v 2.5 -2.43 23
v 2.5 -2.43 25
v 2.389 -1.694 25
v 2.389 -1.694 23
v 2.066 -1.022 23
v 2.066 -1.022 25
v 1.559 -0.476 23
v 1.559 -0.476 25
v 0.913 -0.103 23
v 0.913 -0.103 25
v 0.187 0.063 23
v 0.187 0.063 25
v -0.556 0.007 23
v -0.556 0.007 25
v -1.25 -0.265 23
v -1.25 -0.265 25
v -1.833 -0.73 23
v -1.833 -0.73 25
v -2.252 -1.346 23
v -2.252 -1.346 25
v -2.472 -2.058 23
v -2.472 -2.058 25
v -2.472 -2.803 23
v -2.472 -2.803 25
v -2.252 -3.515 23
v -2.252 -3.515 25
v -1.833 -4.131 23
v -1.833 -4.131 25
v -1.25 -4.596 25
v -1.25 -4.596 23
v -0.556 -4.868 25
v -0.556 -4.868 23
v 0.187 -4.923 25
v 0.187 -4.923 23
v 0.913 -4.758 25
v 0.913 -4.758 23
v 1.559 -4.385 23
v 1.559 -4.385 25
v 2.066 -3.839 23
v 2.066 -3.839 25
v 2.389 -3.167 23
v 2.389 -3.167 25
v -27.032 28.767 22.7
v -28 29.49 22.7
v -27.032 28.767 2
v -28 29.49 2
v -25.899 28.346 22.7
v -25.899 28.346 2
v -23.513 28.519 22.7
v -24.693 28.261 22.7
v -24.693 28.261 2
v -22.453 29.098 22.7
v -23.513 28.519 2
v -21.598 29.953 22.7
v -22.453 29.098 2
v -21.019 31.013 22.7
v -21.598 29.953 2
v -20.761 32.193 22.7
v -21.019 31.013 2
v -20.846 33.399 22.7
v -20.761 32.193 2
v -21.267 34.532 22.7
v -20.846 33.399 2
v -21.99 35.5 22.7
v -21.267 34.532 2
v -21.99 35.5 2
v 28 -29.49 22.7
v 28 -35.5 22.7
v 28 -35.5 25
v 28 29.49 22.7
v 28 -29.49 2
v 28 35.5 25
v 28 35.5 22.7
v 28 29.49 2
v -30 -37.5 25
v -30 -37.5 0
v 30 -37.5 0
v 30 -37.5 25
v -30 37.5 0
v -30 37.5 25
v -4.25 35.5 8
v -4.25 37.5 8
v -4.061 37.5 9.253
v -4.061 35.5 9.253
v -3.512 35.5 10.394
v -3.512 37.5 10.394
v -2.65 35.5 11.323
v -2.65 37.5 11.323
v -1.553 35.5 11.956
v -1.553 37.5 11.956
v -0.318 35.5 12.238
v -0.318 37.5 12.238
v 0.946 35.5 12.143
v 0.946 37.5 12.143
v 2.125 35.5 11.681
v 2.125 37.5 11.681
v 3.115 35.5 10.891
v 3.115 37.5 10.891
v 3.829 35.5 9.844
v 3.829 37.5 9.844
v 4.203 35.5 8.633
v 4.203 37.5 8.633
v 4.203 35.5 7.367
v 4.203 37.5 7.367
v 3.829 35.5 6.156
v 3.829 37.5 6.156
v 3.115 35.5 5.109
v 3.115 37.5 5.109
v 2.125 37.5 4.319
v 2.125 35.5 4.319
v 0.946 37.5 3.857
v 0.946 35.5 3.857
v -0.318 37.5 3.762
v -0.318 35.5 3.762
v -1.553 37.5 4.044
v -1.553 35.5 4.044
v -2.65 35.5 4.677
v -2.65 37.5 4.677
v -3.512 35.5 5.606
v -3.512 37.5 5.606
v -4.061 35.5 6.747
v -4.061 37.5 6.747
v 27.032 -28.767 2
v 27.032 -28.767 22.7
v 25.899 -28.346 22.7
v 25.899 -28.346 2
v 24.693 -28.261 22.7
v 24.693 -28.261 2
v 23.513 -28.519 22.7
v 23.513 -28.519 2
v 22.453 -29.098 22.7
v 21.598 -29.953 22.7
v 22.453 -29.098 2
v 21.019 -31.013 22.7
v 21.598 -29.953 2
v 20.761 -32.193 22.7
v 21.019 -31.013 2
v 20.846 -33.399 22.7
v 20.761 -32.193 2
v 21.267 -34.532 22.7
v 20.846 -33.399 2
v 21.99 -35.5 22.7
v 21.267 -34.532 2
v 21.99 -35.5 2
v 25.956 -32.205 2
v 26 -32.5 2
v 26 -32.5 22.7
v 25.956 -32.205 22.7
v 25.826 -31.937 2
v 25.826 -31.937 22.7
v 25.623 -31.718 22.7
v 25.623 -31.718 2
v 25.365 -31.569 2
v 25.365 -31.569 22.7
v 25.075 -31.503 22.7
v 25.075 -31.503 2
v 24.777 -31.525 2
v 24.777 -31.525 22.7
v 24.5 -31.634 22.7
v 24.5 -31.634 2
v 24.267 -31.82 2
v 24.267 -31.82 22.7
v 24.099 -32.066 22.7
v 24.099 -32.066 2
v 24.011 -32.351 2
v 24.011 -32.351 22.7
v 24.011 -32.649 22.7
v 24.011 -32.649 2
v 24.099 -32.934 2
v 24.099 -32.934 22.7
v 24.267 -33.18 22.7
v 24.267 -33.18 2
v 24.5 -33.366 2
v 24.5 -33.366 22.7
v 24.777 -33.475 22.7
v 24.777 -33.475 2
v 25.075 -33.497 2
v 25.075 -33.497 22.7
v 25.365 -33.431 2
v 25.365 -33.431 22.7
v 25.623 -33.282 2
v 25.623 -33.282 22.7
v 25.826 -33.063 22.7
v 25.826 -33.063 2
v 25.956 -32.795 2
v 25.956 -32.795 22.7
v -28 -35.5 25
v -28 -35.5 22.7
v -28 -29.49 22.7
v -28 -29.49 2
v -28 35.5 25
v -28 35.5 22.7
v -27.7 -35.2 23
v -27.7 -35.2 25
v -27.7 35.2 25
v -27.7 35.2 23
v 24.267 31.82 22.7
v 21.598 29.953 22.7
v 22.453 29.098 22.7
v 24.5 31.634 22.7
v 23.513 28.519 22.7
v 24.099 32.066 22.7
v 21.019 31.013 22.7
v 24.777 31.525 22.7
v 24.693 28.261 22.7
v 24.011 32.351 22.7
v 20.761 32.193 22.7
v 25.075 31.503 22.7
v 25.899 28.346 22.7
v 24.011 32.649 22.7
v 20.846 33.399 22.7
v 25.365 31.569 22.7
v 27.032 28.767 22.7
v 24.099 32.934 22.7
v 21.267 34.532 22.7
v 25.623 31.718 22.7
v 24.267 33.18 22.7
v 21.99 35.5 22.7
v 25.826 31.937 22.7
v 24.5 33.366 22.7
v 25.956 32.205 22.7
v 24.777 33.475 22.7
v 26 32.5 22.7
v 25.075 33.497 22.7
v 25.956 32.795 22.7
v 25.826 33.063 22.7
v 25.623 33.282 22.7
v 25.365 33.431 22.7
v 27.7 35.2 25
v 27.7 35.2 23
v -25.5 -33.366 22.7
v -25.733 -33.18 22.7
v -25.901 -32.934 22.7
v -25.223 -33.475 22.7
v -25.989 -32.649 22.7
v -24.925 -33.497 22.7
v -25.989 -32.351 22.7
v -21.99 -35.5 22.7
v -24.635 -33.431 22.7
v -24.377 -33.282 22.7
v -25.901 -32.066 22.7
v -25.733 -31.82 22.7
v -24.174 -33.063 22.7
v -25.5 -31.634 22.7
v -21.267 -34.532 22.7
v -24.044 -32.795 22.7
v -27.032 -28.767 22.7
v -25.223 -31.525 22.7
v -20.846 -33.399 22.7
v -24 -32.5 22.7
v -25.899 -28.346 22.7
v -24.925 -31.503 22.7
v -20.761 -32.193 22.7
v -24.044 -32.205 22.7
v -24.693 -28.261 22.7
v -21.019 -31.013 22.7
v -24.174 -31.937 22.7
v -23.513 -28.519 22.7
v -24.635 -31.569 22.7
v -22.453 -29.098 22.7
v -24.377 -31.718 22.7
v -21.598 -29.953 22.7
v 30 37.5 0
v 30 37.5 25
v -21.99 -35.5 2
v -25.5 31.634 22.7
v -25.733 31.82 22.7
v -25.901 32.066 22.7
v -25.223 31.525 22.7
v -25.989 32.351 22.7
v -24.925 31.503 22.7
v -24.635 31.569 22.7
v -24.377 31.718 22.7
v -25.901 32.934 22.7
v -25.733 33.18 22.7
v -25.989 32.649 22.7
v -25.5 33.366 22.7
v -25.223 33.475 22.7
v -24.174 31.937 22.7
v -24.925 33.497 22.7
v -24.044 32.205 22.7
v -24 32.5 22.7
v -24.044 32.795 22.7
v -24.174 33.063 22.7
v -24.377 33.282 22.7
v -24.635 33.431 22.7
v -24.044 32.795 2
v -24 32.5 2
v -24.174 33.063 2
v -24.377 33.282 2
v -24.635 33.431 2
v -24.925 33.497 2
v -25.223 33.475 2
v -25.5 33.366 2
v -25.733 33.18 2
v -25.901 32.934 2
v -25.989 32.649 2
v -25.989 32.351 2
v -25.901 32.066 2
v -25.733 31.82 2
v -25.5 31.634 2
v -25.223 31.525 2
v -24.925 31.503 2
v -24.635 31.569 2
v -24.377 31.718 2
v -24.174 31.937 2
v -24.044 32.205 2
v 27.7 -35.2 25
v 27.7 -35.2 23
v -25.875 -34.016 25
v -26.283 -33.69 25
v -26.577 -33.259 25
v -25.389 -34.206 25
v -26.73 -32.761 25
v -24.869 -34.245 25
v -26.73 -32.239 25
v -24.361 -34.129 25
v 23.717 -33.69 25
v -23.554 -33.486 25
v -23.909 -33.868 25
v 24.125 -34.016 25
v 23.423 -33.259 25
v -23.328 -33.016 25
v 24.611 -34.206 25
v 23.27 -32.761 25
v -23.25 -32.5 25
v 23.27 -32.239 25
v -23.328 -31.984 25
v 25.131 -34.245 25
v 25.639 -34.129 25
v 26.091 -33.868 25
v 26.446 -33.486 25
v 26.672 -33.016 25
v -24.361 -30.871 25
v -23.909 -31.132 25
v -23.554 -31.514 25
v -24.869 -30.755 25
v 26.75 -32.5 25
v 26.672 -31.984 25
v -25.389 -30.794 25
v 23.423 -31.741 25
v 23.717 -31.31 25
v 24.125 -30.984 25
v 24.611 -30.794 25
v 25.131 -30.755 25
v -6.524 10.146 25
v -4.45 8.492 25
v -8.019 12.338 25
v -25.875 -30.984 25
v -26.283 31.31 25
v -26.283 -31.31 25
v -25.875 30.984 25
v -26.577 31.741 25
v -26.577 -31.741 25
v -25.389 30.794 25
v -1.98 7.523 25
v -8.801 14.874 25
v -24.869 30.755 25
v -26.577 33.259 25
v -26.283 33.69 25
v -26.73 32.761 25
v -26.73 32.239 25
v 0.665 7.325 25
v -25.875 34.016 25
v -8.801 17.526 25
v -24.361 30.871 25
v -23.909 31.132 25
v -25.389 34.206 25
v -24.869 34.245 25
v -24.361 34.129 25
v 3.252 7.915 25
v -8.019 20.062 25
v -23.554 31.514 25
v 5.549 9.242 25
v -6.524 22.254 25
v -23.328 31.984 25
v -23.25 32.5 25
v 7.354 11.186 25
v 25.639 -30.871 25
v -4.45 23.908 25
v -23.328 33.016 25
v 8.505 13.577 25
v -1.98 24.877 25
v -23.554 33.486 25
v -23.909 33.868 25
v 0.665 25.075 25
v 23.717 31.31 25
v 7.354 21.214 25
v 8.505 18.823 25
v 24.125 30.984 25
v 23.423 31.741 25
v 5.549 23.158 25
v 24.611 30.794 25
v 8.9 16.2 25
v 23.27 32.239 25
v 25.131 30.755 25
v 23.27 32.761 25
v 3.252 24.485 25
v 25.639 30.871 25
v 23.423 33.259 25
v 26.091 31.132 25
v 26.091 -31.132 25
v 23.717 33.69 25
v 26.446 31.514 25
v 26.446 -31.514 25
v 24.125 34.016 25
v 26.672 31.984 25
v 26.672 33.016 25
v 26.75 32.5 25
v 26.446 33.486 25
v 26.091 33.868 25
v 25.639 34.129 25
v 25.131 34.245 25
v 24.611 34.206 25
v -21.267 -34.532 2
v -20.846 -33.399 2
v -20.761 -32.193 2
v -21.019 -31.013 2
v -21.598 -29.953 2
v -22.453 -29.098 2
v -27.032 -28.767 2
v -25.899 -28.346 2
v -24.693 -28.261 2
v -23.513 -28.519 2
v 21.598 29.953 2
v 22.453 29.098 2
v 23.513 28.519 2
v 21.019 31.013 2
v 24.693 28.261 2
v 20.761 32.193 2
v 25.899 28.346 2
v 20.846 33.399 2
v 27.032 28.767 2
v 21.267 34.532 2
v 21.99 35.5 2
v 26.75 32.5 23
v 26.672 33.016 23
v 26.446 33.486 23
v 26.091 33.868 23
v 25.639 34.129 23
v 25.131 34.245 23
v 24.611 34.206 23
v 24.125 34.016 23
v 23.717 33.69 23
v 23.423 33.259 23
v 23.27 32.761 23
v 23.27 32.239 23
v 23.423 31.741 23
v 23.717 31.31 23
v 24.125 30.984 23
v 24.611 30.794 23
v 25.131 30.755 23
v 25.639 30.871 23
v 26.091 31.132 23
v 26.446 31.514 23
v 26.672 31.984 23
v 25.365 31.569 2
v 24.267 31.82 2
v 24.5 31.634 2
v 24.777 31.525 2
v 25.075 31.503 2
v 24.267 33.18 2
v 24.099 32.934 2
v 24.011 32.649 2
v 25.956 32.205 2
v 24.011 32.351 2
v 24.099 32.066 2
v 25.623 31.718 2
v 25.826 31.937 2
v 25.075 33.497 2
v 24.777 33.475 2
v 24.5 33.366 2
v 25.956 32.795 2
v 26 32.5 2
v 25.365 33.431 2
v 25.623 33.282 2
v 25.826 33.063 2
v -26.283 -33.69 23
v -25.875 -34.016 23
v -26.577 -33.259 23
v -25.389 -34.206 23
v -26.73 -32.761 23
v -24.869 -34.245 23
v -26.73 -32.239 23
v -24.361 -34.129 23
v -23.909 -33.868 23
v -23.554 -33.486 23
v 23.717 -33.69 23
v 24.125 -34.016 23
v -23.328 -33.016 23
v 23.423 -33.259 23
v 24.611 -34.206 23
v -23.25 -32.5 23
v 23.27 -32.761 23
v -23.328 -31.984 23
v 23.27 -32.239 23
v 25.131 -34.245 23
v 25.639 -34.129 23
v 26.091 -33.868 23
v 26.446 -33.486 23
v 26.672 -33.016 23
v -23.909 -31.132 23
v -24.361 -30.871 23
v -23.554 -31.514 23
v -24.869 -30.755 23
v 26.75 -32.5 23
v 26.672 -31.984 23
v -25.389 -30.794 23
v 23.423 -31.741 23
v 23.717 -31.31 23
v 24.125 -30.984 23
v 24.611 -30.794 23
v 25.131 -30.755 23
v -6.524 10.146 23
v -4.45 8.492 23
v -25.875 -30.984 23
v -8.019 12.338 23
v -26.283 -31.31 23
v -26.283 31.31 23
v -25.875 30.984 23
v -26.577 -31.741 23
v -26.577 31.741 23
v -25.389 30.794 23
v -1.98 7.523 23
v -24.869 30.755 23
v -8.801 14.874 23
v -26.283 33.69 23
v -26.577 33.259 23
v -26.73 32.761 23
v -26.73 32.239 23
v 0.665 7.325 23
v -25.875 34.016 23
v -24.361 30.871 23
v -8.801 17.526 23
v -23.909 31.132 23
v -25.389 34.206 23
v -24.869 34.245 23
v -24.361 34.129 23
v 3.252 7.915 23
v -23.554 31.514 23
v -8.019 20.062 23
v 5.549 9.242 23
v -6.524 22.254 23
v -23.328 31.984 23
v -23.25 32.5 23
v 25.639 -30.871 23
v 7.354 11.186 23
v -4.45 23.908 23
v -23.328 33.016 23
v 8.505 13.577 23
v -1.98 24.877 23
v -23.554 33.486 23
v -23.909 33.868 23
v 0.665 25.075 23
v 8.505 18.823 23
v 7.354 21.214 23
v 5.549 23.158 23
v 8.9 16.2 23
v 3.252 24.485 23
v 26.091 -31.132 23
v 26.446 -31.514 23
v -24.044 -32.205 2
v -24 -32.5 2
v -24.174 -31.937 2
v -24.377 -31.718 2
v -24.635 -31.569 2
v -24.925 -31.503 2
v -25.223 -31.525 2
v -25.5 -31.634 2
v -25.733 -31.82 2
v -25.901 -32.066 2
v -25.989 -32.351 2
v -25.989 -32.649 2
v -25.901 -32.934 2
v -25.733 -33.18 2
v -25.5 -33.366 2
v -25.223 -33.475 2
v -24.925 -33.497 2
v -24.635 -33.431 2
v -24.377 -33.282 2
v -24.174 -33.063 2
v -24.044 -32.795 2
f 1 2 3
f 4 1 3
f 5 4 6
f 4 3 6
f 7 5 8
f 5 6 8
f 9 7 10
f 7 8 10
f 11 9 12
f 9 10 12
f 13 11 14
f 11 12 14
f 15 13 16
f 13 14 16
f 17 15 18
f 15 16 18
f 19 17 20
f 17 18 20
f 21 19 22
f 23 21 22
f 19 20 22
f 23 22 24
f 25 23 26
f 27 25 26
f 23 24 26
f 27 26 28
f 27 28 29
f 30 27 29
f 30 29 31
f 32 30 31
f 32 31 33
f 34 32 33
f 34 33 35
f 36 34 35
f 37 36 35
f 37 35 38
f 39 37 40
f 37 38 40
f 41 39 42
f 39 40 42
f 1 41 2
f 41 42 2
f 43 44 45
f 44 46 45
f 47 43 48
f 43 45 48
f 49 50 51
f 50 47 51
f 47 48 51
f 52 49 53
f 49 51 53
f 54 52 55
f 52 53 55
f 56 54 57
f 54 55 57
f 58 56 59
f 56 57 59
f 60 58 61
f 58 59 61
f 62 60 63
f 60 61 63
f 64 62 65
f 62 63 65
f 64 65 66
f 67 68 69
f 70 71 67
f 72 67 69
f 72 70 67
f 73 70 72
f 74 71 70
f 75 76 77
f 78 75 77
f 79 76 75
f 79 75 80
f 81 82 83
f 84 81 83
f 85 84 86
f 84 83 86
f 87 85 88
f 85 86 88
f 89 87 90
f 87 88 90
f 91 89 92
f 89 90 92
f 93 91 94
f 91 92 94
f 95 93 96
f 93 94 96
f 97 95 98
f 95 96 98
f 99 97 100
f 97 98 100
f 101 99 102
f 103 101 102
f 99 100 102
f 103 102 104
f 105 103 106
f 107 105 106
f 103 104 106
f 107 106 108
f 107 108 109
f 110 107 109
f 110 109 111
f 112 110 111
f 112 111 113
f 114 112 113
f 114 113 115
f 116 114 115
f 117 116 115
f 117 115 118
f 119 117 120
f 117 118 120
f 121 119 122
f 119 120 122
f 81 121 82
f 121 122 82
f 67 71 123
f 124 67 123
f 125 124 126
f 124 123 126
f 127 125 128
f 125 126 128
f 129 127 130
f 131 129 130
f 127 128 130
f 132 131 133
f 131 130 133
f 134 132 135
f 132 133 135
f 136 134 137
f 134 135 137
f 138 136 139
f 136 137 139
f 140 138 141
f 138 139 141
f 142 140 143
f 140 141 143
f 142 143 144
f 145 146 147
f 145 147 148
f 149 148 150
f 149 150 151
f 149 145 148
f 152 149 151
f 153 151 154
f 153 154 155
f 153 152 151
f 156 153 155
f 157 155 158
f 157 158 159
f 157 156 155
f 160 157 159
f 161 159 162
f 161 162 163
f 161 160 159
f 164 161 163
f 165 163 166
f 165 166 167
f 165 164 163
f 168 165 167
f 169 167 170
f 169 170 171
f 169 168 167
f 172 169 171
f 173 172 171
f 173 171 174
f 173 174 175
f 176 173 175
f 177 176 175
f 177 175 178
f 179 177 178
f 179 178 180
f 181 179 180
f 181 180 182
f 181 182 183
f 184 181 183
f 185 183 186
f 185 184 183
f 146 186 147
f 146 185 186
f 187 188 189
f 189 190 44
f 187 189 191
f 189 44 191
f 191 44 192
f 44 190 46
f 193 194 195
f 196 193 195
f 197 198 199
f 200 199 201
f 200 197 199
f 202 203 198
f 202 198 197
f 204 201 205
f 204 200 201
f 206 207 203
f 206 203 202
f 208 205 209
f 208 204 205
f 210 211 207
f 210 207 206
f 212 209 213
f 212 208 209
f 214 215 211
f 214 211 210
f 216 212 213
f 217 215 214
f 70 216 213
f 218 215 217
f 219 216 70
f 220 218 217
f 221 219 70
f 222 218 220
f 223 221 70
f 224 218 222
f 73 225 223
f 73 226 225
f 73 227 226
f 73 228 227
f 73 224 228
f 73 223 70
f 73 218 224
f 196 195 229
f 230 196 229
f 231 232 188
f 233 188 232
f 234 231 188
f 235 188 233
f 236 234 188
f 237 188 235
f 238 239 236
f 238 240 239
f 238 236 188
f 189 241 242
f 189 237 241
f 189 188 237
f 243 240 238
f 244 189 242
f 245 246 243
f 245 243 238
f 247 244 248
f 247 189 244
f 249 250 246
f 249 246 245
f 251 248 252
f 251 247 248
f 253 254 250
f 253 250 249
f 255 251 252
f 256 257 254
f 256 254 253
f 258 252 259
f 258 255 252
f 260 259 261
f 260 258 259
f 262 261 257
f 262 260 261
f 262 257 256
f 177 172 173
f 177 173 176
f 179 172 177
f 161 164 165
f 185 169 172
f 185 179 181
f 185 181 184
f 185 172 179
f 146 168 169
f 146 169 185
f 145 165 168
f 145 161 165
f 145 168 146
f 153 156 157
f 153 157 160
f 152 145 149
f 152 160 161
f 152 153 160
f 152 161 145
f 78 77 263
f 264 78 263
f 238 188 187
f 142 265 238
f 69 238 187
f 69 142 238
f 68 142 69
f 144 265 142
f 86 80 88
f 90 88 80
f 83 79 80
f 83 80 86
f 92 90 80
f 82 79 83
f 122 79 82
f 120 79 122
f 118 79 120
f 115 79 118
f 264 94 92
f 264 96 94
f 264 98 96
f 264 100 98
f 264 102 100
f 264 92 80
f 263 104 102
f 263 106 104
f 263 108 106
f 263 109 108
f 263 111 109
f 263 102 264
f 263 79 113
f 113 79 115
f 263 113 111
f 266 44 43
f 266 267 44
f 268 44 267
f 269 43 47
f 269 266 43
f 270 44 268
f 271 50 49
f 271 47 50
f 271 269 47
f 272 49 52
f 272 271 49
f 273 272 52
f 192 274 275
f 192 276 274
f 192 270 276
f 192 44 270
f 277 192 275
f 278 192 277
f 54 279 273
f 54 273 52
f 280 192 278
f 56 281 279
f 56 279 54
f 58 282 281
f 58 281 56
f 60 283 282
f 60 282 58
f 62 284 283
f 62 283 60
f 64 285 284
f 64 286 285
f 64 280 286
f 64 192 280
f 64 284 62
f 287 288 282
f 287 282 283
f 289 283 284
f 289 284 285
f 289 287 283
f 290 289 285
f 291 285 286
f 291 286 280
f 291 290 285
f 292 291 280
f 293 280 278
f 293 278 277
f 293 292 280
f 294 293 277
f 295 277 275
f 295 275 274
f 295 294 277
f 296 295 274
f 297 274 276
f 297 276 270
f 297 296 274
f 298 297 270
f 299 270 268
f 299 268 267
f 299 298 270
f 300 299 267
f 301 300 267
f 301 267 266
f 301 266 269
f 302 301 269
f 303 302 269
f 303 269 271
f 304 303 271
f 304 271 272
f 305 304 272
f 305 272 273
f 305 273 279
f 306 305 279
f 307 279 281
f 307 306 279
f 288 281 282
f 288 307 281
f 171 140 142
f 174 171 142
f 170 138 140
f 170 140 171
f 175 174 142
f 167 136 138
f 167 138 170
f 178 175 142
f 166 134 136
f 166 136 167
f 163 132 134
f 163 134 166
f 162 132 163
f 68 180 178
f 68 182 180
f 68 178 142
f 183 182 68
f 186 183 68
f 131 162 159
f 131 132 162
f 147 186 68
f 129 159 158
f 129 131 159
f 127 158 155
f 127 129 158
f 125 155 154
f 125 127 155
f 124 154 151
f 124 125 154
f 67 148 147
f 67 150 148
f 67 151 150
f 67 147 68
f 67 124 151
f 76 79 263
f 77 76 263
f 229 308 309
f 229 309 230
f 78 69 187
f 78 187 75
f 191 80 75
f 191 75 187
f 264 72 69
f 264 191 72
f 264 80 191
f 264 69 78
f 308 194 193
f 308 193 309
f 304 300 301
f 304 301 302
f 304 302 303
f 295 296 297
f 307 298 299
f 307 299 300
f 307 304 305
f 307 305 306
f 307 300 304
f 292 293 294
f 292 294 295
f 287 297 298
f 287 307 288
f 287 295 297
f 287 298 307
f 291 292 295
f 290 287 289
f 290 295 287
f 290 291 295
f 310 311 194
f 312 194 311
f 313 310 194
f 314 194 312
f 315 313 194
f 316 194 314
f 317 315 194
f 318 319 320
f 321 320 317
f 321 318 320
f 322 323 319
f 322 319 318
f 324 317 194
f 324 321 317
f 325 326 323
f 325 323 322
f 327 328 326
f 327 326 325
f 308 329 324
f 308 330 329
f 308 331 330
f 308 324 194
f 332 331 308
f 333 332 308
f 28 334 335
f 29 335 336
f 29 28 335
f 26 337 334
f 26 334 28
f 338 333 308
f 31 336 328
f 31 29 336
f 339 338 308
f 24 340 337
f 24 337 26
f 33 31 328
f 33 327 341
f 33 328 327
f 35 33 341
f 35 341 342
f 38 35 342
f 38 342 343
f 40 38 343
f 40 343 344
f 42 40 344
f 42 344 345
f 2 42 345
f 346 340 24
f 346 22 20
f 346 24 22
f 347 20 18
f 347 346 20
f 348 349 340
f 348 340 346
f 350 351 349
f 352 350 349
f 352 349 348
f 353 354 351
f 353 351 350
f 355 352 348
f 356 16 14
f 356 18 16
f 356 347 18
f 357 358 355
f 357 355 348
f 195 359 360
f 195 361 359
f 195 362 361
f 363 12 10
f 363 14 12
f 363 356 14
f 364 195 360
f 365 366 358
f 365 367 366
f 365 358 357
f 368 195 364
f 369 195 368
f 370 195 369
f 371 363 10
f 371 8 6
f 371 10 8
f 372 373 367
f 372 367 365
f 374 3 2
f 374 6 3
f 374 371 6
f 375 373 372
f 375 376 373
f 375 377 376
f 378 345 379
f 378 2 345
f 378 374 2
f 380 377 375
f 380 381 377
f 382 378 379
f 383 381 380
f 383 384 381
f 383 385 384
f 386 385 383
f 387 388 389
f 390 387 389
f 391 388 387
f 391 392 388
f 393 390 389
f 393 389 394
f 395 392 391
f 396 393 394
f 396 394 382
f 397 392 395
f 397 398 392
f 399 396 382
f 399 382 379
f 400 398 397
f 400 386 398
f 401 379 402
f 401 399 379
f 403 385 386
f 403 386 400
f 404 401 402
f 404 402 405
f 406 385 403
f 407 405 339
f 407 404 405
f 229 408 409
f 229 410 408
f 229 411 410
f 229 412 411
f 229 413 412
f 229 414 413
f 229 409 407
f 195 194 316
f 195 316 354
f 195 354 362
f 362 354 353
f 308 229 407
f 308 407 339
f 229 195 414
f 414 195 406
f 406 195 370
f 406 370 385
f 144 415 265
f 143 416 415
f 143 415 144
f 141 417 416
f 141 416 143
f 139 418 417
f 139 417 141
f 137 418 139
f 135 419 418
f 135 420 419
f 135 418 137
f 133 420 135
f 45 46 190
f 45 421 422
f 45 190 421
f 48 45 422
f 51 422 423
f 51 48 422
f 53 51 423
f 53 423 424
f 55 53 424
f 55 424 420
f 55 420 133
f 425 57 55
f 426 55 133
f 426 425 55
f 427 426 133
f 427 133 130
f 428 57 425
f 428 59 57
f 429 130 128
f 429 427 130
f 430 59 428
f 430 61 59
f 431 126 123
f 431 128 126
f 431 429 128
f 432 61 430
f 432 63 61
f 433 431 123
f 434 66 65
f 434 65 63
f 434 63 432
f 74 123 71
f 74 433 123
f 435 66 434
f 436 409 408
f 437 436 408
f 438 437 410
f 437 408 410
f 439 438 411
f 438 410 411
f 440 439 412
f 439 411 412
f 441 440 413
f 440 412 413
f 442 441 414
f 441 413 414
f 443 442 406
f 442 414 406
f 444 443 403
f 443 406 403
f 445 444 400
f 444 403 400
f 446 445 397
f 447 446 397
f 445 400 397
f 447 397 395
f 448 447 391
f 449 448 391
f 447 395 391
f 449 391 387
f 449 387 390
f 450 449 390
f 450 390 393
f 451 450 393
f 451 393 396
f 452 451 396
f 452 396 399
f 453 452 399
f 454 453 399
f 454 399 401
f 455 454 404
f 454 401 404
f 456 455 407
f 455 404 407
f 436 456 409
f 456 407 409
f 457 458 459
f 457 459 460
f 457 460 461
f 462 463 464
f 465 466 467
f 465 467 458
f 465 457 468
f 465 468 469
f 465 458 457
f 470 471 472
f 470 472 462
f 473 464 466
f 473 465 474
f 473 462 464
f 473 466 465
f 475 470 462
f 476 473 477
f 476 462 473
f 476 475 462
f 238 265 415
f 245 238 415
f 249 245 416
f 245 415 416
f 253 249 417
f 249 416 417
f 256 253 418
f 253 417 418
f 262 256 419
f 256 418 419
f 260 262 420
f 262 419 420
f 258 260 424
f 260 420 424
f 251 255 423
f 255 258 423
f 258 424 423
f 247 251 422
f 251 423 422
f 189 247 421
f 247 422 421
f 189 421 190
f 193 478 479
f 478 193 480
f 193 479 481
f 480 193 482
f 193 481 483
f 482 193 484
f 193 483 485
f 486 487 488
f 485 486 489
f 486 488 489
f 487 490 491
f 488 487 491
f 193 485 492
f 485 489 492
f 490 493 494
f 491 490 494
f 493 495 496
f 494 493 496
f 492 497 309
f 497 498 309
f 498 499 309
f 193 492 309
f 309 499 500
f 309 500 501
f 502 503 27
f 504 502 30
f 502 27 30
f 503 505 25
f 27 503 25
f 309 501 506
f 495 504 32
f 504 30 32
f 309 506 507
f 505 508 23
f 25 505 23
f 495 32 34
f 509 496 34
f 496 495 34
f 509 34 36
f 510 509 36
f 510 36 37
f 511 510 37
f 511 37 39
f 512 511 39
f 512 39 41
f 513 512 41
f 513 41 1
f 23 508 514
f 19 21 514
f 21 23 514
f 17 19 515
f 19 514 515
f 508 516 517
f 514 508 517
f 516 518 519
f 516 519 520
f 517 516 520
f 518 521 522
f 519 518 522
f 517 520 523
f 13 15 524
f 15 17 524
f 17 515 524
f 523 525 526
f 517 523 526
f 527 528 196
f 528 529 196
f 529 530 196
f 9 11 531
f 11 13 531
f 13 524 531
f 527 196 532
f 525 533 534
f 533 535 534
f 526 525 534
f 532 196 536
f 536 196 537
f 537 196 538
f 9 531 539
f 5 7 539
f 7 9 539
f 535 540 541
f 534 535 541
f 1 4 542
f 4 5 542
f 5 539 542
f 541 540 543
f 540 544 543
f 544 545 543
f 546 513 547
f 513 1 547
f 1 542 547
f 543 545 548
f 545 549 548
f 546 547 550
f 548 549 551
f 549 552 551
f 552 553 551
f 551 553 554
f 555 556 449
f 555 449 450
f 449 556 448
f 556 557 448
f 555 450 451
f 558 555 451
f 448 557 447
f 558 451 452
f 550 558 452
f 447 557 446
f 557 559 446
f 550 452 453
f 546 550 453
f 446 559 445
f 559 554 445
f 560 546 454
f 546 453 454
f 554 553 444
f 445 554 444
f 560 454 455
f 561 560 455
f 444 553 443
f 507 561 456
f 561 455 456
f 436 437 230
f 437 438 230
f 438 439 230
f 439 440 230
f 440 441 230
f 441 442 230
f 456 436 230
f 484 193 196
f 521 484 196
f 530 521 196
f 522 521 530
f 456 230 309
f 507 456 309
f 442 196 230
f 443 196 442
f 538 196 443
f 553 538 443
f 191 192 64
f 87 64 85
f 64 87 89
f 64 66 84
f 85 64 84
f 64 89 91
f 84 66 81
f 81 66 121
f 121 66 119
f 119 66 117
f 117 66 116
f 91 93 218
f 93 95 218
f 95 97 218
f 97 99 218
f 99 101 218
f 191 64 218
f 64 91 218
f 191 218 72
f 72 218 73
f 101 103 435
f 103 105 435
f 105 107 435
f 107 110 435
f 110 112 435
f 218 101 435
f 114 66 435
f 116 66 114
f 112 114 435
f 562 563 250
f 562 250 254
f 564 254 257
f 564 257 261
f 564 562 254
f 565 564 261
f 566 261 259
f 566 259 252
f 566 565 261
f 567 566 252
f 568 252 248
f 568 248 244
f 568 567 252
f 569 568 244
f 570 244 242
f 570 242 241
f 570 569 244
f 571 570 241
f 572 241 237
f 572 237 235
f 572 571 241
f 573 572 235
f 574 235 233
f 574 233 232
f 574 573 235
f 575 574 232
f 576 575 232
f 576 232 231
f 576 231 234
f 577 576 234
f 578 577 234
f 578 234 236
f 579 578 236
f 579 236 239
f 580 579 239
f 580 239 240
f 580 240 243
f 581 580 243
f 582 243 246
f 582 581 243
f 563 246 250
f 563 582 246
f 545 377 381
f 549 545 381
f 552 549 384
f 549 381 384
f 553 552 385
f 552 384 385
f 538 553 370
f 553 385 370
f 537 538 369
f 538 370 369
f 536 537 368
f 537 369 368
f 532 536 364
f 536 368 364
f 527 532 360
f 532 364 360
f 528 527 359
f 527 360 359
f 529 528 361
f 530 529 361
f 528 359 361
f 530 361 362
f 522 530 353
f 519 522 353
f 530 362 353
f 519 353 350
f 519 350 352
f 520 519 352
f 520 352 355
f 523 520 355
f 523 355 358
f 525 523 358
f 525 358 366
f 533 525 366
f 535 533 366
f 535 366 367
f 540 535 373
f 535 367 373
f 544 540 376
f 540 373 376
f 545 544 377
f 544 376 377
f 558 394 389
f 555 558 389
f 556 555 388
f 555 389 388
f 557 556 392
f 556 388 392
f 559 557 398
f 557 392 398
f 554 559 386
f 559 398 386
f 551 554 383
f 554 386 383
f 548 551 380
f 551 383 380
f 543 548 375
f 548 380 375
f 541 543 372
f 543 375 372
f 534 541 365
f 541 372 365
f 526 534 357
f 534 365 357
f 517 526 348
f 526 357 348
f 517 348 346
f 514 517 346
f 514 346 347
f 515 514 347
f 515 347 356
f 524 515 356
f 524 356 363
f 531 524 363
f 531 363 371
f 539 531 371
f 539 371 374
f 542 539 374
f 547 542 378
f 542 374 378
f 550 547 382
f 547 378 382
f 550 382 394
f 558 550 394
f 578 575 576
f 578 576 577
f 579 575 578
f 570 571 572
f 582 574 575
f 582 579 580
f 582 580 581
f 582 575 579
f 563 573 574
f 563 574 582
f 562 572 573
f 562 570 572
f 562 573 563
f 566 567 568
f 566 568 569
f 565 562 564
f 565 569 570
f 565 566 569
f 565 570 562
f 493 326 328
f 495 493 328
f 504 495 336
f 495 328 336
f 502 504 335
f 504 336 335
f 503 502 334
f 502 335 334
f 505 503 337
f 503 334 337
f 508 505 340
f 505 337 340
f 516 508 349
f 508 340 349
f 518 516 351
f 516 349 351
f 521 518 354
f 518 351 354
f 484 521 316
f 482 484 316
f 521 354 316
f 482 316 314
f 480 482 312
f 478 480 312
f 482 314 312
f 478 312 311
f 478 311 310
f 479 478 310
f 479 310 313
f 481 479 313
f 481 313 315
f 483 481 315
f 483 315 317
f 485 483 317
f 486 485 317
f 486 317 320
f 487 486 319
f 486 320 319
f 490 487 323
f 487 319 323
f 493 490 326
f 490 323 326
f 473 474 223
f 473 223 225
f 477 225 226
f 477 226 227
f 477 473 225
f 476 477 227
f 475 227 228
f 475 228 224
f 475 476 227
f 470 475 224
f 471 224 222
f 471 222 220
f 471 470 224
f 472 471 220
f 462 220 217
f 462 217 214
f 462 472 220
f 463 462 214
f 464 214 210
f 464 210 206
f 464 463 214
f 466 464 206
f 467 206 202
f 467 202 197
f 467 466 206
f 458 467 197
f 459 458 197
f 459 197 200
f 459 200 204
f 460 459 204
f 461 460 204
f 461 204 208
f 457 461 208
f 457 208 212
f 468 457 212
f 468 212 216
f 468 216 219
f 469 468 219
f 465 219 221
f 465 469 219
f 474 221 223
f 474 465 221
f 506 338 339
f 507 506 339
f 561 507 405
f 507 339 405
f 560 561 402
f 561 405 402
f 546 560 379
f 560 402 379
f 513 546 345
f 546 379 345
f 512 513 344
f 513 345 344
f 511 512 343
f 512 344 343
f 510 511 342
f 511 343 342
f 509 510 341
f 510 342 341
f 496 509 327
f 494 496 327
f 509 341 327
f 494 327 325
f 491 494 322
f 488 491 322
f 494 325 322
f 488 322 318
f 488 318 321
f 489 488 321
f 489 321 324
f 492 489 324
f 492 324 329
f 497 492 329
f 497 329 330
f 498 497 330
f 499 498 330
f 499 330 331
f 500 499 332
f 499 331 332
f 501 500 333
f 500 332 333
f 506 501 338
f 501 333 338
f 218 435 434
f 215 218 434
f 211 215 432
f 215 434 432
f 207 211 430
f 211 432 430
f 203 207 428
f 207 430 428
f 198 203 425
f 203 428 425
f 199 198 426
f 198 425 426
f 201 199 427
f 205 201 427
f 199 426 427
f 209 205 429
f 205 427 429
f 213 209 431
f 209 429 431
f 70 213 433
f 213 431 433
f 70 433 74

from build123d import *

# Parameters (mm, degrees)
F0_W      = 60
F0_H      = 75
F1_DEPTH  = 25
F2_T      = -2
F3_R      = 4.25
F3_R_2    = 1
F4_DEPTH  = 20.7
F5_W      = 55.4
F5_H      = 70.4
F5_R      = 1.75
F6_DEPTH  = 2
F7_R      = 8.9
F7_R_2    = 2.5
F8_DEPTH  = 2
F9_R      = 4.25
F10_DEPTH = 2


with BuildPart() as f1:
    # F0 (on Top) → F1 (new body)
    with BuildSketch(Plane.XY):
        Rectangle(F0_W, F0_H)
    extrude(amount=F1_DEPTH)

    # F2
    f2_openings = [f1.faces().sort_by_distance(p)[0] for p in [
        (0, 0, 25),
    ]]
    offset(amount=F2_T, openings=f2_openings)

    # F3 (on face) → F4 (join)
    with BuildSketch(Plane.XY.offset(2)):
        with Locations((-25, -32.5)):
            Circle(F3_R)
        with Locations((-25, -32.5)):
            Circle(F3_R_2, mode=Mode.SUBTRACT)
        with Locations((25, -32.5)):
            Circle(F3_R)
        with Locations((25, -32.5)):
            Circle(F3_R_2, mode=Mode.SUBTRACT)
        with Locations((25, 32.5)):
            Circle(F3_R)
        with Locations((25, 32.5)):
            Circle(F3_R_2, mode=Mode.SUBTRACT)
        with Locations((-25, 32.5)):
            Circle(F3_R)
        with Locations((-25, 32.5)):
            Circle(F3_R_2, mode=Mode.SUBTRACT)
    extrude(amount=F4_DEPTH)

    # F9 (on face) → F10 (cut, through all)
    with BuildSketch(Plane(origin=(0, 37.5, 0), x_dir=(-1, 0, 0), z_dir=(0, 1, 0))):
        with Locations((0, 8)):
            Circle(F9_R)
    extrude(amount=-F10_DEPTH, mode=Mode.SUBTRACT)


with BuildPart() as f6:
    # F5 (on face) → F6 (new body)
    with BuildSketch(Plane.XY.offset(25)):
        Rectangle(F5_W, F5_H)
        with Locations((-25, -32.5)):
            Circle(F5_R, mode=Mode.SUBTRACT)
        with Locations((25, -32.5)):
            Circle(F5_R, mode=Mode.SUBTRACT)
        with Locations((-25, 32.5)):
            Circle(F5_R, mode=Mode.SUBTRACT)
        with Locations((25, 32.5)):
            Circle(F5_R, mode=Mode.SUBTRACT)
    extrude(amount=-F6_DEPTH)

    # F7 (on face) → F8 (cut, through all)
    with BuildSketch(Plane.XY.offset(25)):
        with Locations((0, 16.2)):
            Circle(F7_R)
        with Locations((0, -2.430438)):
            Circle(F7_R_2)
    extrude(amount=-F8_DEPTH, mode=Mode.SUBTRACT)


solid = Compound([f1.part, f6.part])
